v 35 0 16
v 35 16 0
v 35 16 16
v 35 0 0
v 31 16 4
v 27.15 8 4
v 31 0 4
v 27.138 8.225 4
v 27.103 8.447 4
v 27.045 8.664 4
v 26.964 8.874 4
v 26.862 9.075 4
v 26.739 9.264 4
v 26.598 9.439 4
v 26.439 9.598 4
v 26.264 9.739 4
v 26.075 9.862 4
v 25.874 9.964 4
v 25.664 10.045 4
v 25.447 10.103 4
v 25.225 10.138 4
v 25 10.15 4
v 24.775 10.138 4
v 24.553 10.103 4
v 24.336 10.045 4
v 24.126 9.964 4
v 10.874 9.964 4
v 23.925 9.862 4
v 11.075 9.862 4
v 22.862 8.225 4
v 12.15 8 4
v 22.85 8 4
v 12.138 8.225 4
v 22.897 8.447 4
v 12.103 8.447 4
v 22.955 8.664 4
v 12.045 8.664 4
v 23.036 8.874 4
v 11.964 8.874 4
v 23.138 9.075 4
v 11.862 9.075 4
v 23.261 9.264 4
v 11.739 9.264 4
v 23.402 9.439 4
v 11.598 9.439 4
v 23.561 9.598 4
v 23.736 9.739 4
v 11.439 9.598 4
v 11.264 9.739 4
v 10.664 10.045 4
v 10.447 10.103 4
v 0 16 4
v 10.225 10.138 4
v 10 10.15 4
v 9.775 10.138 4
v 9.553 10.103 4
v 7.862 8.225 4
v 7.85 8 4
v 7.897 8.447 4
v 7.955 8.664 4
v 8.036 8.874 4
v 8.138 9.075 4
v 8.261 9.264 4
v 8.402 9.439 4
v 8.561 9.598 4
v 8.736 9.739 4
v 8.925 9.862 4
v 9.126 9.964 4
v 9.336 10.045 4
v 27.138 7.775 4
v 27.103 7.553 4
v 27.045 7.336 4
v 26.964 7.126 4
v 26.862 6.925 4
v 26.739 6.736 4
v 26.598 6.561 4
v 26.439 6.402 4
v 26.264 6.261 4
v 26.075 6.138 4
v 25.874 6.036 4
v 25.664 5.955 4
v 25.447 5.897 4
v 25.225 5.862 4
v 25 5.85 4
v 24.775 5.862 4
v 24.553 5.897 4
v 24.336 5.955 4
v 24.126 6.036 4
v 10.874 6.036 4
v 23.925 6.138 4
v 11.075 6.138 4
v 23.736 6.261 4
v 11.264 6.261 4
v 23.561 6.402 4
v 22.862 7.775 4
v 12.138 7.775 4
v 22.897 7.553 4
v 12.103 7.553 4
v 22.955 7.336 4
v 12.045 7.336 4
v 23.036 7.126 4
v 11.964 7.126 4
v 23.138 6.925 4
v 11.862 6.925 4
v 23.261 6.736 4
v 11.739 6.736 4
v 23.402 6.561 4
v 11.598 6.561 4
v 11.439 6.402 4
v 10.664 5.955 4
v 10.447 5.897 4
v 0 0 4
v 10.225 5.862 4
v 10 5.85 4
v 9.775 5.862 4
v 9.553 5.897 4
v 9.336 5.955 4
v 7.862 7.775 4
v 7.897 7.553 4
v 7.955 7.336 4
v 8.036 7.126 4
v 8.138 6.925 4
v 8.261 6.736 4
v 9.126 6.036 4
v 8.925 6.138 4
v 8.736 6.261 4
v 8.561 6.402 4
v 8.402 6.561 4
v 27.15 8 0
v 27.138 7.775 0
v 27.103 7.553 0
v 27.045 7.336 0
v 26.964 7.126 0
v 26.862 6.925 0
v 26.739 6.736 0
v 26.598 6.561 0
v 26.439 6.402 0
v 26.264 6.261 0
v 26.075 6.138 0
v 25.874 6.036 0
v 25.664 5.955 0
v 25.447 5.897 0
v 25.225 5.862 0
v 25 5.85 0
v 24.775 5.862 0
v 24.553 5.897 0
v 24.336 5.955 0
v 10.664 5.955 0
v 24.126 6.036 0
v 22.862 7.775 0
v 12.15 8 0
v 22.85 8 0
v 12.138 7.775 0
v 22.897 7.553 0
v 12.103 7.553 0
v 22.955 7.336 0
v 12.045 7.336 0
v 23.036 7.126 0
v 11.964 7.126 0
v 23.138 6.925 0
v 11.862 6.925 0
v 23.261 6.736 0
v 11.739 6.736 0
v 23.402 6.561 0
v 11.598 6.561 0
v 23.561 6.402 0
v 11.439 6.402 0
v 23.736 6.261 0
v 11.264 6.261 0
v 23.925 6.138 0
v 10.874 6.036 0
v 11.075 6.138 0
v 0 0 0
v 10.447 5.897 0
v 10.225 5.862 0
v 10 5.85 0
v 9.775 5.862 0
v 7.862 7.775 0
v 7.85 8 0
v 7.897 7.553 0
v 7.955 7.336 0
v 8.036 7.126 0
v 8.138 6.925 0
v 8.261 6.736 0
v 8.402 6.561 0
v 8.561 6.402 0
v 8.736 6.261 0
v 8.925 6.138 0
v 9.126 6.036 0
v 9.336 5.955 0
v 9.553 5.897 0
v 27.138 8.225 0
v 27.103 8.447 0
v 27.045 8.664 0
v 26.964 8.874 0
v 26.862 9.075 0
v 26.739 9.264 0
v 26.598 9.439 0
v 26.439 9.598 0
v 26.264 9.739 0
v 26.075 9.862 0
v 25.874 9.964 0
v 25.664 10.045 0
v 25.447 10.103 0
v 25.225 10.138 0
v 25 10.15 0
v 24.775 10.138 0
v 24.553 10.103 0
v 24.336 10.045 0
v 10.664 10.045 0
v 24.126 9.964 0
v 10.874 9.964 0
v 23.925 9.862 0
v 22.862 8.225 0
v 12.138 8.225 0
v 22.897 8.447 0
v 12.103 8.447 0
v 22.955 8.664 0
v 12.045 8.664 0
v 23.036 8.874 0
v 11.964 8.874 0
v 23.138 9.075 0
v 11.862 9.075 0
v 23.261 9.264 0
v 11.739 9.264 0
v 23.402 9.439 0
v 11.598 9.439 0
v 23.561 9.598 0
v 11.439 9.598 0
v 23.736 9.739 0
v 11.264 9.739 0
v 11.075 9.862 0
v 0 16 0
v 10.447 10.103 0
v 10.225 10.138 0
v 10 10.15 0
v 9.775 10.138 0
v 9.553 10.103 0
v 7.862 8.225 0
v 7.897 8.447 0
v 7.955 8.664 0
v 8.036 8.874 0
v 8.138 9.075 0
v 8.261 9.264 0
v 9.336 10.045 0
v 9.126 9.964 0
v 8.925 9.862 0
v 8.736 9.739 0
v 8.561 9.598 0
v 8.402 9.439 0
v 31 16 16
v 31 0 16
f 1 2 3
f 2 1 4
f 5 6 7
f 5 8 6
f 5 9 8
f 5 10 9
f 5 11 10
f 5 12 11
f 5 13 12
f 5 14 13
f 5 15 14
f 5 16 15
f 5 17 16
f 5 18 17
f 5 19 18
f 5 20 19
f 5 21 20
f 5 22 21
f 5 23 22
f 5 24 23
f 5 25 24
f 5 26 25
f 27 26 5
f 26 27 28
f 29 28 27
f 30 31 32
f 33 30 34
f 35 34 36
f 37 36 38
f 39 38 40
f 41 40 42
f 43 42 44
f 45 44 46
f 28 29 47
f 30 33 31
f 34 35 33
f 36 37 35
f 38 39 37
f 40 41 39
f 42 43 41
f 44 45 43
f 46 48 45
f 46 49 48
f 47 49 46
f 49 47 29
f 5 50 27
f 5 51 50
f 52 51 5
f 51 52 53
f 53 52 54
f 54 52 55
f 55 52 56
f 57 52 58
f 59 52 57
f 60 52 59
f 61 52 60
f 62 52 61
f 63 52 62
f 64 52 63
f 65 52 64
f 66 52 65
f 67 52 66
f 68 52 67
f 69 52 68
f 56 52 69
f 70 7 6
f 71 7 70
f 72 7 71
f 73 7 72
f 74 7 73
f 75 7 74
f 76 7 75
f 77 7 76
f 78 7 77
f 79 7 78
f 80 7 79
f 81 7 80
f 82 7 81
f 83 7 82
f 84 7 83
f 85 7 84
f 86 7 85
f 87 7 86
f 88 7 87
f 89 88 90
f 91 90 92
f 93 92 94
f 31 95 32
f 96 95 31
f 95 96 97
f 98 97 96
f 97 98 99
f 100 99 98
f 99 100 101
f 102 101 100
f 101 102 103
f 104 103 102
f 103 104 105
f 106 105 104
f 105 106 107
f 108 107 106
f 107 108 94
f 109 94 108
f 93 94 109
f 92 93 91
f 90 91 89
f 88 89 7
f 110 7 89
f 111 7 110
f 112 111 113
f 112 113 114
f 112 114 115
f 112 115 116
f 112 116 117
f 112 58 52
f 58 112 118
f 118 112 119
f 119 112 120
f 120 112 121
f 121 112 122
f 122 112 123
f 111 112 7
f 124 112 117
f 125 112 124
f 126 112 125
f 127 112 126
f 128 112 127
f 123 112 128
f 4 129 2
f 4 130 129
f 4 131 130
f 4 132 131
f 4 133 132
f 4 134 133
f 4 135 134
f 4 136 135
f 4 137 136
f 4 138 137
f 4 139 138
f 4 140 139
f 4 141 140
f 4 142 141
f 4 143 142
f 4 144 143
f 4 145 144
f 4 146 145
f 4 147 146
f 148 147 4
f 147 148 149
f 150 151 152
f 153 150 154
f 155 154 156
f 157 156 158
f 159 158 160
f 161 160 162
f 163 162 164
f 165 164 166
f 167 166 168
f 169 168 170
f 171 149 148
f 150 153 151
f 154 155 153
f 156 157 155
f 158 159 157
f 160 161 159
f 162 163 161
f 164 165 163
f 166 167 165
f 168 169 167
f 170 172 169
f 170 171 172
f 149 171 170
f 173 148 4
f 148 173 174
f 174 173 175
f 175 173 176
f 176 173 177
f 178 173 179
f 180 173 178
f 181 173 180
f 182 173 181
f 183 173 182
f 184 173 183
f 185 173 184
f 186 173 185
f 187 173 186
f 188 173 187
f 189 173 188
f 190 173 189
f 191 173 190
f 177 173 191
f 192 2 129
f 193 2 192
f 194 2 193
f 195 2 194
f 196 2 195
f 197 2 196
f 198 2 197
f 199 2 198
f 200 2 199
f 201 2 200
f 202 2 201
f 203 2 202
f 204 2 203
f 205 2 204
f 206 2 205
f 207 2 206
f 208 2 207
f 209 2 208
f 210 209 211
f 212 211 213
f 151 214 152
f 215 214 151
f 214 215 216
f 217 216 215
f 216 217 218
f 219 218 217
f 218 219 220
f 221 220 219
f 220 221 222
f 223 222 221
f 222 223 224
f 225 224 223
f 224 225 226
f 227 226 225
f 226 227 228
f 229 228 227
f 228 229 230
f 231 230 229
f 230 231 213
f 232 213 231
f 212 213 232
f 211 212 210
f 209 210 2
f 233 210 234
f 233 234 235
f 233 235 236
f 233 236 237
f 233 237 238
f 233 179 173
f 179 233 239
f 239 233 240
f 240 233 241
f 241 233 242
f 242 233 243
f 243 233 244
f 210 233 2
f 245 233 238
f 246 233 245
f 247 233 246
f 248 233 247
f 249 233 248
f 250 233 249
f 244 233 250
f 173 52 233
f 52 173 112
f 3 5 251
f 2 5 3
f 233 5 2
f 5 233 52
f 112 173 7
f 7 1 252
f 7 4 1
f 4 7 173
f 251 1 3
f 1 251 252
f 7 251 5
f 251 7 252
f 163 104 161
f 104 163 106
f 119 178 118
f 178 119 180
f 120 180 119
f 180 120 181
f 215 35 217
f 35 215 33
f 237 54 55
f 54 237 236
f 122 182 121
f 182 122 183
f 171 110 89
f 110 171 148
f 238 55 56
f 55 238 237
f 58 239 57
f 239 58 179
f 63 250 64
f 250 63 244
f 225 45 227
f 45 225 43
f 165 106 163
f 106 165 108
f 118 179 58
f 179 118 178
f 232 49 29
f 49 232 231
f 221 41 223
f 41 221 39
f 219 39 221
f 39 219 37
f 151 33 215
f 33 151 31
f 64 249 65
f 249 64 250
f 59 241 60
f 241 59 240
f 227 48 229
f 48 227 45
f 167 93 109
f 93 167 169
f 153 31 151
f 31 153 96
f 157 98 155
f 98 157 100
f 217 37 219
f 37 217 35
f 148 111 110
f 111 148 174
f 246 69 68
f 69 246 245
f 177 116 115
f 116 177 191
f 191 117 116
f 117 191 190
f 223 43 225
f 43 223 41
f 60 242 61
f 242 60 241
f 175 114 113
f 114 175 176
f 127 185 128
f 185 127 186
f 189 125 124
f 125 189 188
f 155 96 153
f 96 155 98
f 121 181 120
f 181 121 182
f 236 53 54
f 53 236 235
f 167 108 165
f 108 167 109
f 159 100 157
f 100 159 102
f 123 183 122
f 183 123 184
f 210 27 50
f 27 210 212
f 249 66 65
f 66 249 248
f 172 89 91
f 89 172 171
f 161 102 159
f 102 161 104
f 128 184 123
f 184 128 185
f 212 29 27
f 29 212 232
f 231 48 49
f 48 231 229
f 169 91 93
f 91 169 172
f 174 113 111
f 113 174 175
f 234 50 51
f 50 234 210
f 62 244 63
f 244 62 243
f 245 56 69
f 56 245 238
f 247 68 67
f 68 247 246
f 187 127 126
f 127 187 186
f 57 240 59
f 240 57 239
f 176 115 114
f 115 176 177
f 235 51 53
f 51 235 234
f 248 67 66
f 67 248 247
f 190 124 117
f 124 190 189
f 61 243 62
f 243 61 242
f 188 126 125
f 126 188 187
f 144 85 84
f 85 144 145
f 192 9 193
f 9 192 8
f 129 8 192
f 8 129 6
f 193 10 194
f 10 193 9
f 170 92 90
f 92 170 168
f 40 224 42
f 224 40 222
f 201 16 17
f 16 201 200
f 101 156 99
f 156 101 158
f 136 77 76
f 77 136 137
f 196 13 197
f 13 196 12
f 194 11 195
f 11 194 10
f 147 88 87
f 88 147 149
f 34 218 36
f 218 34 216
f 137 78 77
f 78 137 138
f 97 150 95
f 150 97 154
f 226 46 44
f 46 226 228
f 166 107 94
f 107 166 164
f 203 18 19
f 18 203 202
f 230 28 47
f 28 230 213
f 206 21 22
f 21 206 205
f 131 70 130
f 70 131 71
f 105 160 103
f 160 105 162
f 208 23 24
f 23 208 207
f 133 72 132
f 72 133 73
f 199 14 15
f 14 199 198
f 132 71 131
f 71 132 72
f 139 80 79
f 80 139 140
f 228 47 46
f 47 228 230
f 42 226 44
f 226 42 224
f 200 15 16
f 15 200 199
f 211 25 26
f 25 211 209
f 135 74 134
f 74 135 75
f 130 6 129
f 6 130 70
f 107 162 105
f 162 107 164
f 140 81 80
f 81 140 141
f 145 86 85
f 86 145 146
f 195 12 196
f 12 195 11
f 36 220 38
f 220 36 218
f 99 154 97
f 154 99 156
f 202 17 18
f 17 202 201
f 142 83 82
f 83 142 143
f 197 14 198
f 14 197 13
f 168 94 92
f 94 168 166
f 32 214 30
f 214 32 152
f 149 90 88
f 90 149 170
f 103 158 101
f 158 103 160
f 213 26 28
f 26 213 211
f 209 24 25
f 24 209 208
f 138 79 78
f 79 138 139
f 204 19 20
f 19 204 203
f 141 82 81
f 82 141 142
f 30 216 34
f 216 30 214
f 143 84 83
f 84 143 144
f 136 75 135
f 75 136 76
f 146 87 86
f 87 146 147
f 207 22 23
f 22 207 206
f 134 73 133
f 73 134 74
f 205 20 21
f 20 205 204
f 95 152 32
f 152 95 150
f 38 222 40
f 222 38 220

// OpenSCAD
// Latch hook bracket.
$fn = 60;
eps = 0.02;
length = 35;
height = 12;
width = 16;
thickness = 4;
difference() { union() { cube([length,width,thickness]); translate([length-thickness,0,thickness]) cube([thickness,width,height]); } for(x=[10,length-10]) translate([x,width/2,-eps]) cylinder(d=4.3,h=thickness+2*eps); }
